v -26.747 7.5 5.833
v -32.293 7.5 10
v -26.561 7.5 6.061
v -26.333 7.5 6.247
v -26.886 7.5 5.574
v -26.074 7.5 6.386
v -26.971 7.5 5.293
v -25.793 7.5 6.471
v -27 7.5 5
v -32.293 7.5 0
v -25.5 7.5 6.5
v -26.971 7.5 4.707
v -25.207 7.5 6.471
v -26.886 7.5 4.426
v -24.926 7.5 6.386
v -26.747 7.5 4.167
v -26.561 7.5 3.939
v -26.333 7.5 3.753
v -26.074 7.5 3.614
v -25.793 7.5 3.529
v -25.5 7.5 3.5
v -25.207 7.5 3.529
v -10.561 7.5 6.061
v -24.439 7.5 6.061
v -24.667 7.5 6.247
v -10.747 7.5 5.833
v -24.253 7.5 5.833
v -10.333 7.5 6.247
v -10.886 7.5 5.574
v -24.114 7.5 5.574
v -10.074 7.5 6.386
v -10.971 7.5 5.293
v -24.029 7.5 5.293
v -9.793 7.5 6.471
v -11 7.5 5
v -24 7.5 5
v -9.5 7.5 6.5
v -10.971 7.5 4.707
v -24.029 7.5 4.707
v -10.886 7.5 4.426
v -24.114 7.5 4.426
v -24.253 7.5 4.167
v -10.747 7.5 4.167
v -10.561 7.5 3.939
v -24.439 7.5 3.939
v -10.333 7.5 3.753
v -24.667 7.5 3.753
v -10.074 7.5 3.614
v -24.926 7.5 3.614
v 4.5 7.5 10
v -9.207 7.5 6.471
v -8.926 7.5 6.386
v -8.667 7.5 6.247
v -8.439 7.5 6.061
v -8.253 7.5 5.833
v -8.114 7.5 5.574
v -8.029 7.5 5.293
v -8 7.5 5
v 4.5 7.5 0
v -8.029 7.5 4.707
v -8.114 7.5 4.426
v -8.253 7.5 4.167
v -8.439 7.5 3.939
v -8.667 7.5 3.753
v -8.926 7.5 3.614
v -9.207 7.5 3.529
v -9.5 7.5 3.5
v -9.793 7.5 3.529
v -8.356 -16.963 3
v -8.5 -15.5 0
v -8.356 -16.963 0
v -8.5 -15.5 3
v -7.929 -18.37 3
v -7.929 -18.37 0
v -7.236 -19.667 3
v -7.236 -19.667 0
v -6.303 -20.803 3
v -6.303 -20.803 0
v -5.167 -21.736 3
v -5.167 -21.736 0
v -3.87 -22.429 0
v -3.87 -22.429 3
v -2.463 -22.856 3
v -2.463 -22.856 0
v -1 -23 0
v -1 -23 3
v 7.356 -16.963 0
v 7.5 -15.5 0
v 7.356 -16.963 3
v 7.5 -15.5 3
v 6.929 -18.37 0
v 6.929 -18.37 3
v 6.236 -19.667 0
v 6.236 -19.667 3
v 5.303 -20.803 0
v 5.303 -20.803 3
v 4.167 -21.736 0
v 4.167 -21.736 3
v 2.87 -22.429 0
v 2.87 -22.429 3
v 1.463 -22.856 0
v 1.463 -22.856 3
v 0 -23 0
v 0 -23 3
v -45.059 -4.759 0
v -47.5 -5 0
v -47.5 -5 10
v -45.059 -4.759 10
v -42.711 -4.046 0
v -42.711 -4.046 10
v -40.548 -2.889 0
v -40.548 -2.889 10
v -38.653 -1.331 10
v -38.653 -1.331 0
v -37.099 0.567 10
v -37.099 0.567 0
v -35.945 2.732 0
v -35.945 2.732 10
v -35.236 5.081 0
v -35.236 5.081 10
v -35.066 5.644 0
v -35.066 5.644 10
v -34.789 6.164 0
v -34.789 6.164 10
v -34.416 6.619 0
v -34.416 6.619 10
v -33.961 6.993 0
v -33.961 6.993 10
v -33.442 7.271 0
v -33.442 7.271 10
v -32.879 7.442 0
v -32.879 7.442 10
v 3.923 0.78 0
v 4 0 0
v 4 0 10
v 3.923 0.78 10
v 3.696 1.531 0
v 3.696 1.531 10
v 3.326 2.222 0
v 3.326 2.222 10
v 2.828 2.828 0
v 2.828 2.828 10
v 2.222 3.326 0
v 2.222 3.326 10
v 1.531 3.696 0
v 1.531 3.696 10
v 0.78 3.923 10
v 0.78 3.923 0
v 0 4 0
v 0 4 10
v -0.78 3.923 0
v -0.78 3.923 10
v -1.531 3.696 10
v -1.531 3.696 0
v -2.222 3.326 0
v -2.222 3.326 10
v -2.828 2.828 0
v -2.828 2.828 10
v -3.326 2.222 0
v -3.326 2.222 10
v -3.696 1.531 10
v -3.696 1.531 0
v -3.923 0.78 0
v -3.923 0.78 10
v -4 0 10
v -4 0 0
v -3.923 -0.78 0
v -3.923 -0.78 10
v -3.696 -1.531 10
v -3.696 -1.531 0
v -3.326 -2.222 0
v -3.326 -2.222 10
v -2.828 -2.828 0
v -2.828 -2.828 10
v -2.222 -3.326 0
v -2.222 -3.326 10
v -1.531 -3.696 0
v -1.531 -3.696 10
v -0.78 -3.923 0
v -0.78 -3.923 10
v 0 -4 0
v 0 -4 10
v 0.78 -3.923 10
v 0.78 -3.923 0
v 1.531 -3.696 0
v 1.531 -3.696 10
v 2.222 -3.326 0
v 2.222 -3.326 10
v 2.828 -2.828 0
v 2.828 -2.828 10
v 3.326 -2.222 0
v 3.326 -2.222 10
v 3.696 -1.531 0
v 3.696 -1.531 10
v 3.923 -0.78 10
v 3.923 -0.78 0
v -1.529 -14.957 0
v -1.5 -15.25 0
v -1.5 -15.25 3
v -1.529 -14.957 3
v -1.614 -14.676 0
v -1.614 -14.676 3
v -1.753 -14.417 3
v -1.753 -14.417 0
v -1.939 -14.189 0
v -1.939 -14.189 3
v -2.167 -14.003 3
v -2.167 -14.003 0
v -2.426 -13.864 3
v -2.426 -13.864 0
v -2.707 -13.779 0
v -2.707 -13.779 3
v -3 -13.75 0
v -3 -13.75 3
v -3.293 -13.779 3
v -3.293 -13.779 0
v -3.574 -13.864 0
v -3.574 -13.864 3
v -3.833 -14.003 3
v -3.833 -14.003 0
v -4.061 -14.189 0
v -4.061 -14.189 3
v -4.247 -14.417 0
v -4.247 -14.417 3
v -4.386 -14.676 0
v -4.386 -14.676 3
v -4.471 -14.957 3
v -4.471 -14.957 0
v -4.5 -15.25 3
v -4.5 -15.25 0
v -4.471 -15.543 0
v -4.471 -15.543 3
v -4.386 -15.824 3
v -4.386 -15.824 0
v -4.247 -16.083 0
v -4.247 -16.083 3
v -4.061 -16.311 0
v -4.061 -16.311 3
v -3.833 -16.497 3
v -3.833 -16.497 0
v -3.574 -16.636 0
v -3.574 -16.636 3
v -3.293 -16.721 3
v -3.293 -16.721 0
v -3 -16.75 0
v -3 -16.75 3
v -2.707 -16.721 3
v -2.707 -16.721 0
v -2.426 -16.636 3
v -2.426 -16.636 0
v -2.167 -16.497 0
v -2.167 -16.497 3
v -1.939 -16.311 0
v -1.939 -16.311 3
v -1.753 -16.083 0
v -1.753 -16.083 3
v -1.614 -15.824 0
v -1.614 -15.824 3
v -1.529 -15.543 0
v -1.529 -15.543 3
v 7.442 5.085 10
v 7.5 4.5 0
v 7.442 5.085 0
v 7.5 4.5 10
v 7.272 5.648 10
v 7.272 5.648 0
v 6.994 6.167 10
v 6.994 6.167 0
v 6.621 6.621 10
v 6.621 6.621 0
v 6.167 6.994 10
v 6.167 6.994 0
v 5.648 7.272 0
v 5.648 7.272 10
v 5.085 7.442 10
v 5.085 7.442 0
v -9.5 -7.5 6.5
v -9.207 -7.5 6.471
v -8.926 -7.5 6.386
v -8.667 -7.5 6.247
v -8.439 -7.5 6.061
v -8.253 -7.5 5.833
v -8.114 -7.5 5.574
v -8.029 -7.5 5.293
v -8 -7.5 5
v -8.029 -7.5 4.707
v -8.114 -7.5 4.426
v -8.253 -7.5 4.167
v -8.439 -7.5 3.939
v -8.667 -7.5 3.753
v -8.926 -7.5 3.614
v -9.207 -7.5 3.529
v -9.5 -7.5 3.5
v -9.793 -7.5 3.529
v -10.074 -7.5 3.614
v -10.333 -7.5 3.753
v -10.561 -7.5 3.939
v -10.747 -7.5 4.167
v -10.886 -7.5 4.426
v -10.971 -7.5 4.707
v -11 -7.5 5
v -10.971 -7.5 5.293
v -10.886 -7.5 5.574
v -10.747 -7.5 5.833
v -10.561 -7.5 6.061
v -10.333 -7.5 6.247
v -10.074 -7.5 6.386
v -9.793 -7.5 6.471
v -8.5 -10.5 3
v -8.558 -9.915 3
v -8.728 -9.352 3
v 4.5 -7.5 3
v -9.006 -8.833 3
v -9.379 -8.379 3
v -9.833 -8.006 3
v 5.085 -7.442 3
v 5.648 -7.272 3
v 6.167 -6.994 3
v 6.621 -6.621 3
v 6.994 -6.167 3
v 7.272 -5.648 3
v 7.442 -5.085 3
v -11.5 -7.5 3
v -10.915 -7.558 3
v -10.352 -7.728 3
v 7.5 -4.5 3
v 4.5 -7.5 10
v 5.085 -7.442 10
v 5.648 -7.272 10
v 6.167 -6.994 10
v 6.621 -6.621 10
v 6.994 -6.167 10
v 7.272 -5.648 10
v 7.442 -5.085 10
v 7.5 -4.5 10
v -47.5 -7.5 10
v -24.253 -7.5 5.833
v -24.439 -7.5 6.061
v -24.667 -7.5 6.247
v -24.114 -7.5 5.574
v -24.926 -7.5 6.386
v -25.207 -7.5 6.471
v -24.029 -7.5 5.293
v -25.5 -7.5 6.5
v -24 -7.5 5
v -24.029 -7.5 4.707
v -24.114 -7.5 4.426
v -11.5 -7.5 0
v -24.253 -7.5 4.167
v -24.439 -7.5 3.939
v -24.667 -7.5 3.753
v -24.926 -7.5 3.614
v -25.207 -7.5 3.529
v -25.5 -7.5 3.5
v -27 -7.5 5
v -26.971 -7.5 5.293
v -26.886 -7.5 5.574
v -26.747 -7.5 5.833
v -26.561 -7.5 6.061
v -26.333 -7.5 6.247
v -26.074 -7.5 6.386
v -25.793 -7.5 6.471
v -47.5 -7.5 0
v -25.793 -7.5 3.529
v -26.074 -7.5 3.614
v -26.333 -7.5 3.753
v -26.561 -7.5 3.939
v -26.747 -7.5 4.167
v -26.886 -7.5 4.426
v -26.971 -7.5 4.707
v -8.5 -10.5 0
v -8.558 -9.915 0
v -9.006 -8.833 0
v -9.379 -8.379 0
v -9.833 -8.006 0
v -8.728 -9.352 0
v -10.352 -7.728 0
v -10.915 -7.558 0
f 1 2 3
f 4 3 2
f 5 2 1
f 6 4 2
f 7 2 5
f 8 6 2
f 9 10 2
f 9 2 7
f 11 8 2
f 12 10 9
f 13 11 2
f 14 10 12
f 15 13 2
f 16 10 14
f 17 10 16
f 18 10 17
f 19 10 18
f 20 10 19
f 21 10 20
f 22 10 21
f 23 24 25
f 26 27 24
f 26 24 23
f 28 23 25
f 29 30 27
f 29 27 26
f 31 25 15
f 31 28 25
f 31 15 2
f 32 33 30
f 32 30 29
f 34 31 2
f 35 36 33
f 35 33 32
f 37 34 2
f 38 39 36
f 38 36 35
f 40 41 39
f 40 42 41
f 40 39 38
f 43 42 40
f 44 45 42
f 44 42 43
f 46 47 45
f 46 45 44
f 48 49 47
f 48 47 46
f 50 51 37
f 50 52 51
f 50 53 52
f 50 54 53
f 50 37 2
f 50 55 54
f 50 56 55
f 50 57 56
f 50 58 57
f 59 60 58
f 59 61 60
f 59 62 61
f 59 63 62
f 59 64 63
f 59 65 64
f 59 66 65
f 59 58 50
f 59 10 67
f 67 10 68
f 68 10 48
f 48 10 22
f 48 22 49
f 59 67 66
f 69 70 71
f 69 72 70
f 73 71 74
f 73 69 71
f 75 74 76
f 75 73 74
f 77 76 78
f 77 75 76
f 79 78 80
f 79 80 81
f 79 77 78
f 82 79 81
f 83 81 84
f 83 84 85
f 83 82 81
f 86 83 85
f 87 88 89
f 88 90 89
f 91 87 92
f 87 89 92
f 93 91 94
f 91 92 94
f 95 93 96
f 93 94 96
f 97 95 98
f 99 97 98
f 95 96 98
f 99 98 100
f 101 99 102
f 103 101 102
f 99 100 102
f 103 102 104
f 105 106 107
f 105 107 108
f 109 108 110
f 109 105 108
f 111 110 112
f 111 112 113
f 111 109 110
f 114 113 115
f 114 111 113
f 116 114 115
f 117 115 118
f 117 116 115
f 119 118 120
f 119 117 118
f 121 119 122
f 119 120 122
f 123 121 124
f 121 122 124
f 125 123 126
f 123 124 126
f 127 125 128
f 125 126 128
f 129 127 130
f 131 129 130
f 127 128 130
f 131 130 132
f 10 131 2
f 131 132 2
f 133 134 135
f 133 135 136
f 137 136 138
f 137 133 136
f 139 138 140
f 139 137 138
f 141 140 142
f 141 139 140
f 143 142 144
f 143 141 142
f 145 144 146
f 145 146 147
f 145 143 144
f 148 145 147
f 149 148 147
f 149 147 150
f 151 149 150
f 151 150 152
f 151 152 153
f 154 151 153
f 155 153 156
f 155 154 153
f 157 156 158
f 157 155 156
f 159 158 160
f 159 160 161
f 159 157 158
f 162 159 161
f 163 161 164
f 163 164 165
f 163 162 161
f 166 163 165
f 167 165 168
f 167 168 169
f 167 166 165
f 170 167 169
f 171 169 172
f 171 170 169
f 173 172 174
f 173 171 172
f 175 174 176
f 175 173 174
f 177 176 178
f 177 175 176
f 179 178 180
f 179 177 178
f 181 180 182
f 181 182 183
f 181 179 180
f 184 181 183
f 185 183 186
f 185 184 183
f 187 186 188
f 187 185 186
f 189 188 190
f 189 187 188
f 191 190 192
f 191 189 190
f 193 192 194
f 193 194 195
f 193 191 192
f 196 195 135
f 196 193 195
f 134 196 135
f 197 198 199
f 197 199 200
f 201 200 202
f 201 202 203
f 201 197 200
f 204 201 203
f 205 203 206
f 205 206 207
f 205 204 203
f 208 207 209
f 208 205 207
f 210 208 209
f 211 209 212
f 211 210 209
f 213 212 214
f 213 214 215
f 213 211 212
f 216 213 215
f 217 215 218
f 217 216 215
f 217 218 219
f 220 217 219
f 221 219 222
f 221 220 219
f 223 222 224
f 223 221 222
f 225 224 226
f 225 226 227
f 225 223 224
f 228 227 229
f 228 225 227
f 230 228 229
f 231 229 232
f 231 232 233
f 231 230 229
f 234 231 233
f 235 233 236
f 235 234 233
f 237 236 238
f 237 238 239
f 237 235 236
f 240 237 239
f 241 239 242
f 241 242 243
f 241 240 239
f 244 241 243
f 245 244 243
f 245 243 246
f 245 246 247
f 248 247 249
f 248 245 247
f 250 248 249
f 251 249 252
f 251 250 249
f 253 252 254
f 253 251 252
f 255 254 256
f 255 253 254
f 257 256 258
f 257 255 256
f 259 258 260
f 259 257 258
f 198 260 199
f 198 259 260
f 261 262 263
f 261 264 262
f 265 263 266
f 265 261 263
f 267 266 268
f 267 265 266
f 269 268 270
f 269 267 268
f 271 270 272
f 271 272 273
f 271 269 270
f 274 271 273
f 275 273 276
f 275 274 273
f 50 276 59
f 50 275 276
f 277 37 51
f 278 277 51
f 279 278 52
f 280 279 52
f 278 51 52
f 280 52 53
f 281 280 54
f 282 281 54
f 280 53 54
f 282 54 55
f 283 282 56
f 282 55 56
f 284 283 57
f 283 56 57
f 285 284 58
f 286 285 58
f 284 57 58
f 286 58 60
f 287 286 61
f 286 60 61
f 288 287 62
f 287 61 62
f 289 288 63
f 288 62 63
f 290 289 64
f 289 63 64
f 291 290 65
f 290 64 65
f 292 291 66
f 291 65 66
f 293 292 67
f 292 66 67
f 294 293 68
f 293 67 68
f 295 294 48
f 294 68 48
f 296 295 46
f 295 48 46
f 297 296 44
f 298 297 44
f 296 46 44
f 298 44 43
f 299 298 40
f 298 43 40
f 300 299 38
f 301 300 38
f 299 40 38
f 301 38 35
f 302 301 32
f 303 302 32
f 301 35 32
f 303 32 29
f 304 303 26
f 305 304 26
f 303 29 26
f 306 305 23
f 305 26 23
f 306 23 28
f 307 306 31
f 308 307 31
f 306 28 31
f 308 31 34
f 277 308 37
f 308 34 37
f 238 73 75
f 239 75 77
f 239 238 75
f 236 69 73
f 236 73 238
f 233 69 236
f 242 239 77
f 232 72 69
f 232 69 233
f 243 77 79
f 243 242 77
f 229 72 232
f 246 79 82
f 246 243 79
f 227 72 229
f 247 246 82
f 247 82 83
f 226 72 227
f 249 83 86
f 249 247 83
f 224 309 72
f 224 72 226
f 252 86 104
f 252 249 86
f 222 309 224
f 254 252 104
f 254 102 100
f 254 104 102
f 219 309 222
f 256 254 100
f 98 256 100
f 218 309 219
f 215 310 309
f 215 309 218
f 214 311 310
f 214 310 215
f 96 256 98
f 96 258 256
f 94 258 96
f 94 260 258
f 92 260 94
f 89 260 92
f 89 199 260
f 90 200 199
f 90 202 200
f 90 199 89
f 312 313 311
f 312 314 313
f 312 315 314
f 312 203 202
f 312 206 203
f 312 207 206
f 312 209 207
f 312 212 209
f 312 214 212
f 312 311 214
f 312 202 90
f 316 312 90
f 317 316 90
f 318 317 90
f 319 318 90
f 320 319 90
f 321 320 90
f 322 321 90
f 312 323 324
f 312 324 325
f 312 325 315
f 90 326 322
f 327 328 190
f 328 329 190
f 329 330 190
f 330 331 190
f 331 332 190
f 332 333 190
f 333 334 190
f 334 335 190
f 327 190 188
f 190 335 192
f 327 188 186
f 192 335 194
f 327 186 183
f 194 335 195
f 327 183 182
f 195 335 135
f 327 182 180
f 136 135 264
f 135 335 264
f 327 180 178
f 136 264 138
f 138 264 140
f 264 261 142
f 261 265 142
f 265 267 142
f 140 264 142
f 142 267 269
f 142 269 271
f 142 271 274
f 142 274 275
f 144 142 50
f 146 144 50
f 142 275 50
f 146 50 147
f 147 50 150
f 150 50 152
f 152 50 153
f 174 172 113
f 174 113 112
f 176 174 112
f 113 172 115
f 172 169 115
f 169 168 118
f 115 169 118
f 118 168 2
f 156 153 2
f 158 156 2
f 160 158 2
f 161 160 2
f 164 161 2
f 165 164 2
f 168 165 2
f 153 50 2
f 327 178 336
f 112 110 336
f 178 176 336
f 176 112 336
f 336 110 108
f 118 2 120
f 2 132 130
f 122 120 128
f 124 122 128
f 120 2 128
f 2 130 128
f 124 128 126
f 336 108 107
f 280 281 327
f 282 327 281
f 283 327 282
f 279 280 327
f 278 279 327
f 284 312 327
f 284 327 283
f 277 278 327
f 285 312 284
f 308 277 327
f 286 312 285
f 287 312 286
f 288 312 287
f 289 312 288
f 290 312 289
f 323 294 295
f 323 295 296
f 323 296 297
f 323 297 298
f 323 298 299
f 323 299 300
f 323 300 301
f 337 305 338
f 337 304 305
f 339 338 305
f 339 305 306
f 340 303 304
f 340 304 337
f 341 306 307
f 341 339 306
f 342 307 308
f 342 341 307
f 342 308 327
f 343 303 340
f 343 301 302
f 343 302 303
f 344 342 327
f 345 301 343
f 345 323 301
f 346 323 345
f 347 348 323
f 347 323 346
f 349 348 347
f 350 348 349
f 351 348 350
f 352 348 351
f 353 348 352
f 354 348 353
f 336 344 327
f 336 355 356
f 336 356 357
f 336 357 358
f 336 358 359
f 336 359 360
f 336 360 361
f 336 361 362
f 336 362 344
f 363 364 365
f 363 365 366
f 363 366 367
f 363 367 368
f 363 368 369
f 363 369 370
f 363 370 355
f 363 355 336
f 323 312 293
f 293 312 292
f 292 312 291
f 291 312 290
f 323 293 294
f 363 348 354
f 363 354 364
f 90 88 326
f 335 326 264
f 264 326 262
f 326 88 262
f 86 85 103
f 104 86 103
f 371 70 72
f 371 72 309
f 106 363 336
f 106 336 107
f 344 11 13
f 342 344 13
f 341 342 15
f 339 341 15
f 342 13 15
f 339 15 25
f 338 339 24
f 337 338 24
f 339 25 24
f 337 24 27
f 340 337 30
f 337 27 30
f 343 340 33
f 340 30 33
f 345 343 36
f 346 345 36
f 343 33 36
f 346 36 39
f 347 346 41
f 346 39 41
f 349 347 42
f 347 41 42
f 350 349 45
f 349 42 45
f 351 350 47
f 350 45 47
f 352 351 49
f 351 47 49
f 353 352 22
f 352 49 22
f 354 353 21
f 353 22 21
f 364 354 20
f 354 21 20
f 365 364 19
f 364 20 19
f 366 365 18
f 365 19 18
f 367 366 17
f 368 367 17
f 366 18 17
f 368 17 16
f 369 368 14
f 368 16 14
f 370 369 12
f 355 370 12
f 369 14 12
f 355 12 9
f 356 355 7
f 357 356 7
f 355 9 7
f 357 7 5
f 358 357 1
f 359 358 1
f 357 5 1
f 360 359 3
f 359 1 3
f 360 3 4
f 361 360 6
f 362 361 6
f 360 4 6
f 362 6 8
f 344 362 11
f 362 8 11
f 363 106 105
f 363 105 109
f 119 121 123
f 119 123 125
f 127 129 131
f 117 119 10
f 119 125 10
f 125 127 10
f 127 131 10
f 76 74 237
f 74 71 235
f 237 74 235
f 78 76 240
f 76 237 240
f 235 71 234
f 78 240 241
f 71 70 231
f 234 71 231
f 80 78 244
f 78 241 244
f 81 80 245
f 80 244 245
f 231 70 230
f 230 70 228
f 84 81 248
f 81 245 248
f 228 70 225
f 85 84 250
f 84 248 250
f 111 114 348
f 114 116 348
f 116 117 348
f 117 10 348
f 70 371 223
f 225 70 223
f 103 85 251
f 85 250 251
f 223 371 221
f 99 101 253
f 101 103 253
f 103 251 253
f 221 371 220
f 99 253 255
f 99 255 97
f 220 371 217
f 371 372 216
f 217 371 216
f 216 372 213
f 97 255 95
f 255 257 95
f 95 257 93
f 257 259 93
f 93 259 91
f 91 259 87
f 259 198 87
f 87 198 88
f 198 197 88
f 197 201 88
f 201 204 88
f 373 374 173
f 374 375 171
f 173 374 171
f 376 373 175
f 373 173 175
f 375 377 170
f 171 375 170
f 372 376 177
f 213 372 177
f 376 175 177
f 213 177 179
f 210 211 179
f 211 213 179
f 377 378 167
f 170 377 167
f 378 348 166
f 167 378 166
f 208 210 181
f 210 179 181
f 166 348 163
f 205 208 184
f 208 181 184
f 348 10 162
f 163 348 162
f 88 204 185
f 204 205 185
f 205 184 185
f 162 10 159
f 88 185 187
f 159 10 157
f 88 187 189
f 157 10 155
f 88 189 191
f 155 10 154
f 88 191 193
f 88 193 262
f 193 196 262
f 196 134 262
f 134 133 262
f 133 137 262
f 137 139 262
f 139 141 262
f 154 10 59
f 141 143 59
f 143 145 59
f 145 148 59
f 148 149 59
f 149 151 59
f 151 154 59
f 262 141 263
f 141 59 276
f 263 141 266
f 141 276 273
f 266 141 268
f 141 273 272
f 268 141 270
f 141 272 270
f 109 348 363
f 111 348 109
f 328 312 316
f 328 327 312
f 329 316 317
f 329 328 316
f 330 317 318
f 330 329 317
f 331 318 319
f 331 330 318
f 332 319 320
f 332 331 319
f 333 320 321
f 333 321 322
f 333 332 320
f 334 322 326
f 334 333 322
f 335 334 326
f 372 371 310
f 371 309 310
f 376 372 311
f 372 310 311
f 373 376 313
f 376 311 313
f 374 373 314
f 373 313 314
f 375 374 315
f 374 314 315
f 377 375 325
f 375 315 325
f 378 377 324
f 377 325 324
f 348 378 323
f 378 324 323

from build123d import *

# Parameters (mm, degrees)
CROQUIS1_R              = 4
SALIENTE_EXTRUIR1_DEPTH = 10
CROQUIS3_W              = 16
CROQUIS3_H              = 15.5
CROQUIS3_R              = 1.5
SALIENTE_EXTRUIR2_DEPTH = 3
REDONDEO1_R             = 7.5
REDONDEO2_R             = 3
CROQUIS4_R              = 1.5
CORTAR_EXTRUIR2_DEPTH   = 15
REDONDEO3_R             = 3


with BuildPart() as part:
    # Croquis1 → Saliente-Extruir1 (new body)
    with BuildSketch(Plane.XY):
        with BuildLine():
            Line((-35, 7.5), (7.5, 7.5))
            Line((7.5, 7.5), (7.5, -7.5))
            Line((7.5, -7.5), (-47.5, -7.5))
            Line((-47.5, -7.5), (-47.5, -5))
            ThreePointArc((-47.5, -5), (-38.661165235, -1.338834765), (-35, 7.5))
        make_face()
        Circle(CROQUIS1_R, mode=Mode.SUBTRACT)
    extrude(amount=SALIENTE_EXTRUIR1_DEPTH)

    # Croquis3 → Saliente-Extruir2 (add)
    with BuildSketch(Plane.XY):
        with Locations((-0.5, -15.25)):
            Rectangle(CROQUIS3_W, CROQUIS3_H)
        with Locations((-3, -15.25)):
            Circle(CROQUIS3_R, mode=Mode.SUBTRACT)
    extrude(amount=SALIENTE_EXTRUIR2_DEPTH)

    # Redondeo1
    redondeo1_edges = [part.edges().sort_by_distance(p)[0] for p in [
        (7.5, -23, 1.5),
        (-8.5, -23, 1.5),
    ]]
    fillet(redondeo1_edges, radius=REDONDEO1_R)

    # Redondeo2
    redondeo2_edges = [part.edges().sort_by_distance(p)[0] for p in [
        (-8.5, -7.5, 1.5),
    ]]
    fillet(redondeo2_edges, radius=REDONDEO2_R)

    # Croquis4 → Cortar-Extruir2 (cut)
    with BuildSketch(Plane(origin=(0, 7.5, 0), x_dir=(1, 0, 0), z_dir=(0, 1, 0))):
        with Locations(Location((-25.5, -5, 0), (0, 0, 270))):
            Circle(CROQUIS4_R)
        with Locations(Location((-9.5, -5, 0), (0, 0, 270))):
            Circle(CROQUIS4_R)
    extrude(amount=-CORTAR_EXTRUIR2_DEPTH, mode=Mode.SUBTRACT)

    # Redondeo3
    redondeo3_edges = [part.edges().sort_by_distance(p)[0] for p in [
        (7.5, -7.5, 6.5),
        (-35, 7.5, 5),
        (7.5, 7.5, 5),
    ]]
    fillet(redondeo3_edges, radius=REDONDEO3_R)


solid = part.part
